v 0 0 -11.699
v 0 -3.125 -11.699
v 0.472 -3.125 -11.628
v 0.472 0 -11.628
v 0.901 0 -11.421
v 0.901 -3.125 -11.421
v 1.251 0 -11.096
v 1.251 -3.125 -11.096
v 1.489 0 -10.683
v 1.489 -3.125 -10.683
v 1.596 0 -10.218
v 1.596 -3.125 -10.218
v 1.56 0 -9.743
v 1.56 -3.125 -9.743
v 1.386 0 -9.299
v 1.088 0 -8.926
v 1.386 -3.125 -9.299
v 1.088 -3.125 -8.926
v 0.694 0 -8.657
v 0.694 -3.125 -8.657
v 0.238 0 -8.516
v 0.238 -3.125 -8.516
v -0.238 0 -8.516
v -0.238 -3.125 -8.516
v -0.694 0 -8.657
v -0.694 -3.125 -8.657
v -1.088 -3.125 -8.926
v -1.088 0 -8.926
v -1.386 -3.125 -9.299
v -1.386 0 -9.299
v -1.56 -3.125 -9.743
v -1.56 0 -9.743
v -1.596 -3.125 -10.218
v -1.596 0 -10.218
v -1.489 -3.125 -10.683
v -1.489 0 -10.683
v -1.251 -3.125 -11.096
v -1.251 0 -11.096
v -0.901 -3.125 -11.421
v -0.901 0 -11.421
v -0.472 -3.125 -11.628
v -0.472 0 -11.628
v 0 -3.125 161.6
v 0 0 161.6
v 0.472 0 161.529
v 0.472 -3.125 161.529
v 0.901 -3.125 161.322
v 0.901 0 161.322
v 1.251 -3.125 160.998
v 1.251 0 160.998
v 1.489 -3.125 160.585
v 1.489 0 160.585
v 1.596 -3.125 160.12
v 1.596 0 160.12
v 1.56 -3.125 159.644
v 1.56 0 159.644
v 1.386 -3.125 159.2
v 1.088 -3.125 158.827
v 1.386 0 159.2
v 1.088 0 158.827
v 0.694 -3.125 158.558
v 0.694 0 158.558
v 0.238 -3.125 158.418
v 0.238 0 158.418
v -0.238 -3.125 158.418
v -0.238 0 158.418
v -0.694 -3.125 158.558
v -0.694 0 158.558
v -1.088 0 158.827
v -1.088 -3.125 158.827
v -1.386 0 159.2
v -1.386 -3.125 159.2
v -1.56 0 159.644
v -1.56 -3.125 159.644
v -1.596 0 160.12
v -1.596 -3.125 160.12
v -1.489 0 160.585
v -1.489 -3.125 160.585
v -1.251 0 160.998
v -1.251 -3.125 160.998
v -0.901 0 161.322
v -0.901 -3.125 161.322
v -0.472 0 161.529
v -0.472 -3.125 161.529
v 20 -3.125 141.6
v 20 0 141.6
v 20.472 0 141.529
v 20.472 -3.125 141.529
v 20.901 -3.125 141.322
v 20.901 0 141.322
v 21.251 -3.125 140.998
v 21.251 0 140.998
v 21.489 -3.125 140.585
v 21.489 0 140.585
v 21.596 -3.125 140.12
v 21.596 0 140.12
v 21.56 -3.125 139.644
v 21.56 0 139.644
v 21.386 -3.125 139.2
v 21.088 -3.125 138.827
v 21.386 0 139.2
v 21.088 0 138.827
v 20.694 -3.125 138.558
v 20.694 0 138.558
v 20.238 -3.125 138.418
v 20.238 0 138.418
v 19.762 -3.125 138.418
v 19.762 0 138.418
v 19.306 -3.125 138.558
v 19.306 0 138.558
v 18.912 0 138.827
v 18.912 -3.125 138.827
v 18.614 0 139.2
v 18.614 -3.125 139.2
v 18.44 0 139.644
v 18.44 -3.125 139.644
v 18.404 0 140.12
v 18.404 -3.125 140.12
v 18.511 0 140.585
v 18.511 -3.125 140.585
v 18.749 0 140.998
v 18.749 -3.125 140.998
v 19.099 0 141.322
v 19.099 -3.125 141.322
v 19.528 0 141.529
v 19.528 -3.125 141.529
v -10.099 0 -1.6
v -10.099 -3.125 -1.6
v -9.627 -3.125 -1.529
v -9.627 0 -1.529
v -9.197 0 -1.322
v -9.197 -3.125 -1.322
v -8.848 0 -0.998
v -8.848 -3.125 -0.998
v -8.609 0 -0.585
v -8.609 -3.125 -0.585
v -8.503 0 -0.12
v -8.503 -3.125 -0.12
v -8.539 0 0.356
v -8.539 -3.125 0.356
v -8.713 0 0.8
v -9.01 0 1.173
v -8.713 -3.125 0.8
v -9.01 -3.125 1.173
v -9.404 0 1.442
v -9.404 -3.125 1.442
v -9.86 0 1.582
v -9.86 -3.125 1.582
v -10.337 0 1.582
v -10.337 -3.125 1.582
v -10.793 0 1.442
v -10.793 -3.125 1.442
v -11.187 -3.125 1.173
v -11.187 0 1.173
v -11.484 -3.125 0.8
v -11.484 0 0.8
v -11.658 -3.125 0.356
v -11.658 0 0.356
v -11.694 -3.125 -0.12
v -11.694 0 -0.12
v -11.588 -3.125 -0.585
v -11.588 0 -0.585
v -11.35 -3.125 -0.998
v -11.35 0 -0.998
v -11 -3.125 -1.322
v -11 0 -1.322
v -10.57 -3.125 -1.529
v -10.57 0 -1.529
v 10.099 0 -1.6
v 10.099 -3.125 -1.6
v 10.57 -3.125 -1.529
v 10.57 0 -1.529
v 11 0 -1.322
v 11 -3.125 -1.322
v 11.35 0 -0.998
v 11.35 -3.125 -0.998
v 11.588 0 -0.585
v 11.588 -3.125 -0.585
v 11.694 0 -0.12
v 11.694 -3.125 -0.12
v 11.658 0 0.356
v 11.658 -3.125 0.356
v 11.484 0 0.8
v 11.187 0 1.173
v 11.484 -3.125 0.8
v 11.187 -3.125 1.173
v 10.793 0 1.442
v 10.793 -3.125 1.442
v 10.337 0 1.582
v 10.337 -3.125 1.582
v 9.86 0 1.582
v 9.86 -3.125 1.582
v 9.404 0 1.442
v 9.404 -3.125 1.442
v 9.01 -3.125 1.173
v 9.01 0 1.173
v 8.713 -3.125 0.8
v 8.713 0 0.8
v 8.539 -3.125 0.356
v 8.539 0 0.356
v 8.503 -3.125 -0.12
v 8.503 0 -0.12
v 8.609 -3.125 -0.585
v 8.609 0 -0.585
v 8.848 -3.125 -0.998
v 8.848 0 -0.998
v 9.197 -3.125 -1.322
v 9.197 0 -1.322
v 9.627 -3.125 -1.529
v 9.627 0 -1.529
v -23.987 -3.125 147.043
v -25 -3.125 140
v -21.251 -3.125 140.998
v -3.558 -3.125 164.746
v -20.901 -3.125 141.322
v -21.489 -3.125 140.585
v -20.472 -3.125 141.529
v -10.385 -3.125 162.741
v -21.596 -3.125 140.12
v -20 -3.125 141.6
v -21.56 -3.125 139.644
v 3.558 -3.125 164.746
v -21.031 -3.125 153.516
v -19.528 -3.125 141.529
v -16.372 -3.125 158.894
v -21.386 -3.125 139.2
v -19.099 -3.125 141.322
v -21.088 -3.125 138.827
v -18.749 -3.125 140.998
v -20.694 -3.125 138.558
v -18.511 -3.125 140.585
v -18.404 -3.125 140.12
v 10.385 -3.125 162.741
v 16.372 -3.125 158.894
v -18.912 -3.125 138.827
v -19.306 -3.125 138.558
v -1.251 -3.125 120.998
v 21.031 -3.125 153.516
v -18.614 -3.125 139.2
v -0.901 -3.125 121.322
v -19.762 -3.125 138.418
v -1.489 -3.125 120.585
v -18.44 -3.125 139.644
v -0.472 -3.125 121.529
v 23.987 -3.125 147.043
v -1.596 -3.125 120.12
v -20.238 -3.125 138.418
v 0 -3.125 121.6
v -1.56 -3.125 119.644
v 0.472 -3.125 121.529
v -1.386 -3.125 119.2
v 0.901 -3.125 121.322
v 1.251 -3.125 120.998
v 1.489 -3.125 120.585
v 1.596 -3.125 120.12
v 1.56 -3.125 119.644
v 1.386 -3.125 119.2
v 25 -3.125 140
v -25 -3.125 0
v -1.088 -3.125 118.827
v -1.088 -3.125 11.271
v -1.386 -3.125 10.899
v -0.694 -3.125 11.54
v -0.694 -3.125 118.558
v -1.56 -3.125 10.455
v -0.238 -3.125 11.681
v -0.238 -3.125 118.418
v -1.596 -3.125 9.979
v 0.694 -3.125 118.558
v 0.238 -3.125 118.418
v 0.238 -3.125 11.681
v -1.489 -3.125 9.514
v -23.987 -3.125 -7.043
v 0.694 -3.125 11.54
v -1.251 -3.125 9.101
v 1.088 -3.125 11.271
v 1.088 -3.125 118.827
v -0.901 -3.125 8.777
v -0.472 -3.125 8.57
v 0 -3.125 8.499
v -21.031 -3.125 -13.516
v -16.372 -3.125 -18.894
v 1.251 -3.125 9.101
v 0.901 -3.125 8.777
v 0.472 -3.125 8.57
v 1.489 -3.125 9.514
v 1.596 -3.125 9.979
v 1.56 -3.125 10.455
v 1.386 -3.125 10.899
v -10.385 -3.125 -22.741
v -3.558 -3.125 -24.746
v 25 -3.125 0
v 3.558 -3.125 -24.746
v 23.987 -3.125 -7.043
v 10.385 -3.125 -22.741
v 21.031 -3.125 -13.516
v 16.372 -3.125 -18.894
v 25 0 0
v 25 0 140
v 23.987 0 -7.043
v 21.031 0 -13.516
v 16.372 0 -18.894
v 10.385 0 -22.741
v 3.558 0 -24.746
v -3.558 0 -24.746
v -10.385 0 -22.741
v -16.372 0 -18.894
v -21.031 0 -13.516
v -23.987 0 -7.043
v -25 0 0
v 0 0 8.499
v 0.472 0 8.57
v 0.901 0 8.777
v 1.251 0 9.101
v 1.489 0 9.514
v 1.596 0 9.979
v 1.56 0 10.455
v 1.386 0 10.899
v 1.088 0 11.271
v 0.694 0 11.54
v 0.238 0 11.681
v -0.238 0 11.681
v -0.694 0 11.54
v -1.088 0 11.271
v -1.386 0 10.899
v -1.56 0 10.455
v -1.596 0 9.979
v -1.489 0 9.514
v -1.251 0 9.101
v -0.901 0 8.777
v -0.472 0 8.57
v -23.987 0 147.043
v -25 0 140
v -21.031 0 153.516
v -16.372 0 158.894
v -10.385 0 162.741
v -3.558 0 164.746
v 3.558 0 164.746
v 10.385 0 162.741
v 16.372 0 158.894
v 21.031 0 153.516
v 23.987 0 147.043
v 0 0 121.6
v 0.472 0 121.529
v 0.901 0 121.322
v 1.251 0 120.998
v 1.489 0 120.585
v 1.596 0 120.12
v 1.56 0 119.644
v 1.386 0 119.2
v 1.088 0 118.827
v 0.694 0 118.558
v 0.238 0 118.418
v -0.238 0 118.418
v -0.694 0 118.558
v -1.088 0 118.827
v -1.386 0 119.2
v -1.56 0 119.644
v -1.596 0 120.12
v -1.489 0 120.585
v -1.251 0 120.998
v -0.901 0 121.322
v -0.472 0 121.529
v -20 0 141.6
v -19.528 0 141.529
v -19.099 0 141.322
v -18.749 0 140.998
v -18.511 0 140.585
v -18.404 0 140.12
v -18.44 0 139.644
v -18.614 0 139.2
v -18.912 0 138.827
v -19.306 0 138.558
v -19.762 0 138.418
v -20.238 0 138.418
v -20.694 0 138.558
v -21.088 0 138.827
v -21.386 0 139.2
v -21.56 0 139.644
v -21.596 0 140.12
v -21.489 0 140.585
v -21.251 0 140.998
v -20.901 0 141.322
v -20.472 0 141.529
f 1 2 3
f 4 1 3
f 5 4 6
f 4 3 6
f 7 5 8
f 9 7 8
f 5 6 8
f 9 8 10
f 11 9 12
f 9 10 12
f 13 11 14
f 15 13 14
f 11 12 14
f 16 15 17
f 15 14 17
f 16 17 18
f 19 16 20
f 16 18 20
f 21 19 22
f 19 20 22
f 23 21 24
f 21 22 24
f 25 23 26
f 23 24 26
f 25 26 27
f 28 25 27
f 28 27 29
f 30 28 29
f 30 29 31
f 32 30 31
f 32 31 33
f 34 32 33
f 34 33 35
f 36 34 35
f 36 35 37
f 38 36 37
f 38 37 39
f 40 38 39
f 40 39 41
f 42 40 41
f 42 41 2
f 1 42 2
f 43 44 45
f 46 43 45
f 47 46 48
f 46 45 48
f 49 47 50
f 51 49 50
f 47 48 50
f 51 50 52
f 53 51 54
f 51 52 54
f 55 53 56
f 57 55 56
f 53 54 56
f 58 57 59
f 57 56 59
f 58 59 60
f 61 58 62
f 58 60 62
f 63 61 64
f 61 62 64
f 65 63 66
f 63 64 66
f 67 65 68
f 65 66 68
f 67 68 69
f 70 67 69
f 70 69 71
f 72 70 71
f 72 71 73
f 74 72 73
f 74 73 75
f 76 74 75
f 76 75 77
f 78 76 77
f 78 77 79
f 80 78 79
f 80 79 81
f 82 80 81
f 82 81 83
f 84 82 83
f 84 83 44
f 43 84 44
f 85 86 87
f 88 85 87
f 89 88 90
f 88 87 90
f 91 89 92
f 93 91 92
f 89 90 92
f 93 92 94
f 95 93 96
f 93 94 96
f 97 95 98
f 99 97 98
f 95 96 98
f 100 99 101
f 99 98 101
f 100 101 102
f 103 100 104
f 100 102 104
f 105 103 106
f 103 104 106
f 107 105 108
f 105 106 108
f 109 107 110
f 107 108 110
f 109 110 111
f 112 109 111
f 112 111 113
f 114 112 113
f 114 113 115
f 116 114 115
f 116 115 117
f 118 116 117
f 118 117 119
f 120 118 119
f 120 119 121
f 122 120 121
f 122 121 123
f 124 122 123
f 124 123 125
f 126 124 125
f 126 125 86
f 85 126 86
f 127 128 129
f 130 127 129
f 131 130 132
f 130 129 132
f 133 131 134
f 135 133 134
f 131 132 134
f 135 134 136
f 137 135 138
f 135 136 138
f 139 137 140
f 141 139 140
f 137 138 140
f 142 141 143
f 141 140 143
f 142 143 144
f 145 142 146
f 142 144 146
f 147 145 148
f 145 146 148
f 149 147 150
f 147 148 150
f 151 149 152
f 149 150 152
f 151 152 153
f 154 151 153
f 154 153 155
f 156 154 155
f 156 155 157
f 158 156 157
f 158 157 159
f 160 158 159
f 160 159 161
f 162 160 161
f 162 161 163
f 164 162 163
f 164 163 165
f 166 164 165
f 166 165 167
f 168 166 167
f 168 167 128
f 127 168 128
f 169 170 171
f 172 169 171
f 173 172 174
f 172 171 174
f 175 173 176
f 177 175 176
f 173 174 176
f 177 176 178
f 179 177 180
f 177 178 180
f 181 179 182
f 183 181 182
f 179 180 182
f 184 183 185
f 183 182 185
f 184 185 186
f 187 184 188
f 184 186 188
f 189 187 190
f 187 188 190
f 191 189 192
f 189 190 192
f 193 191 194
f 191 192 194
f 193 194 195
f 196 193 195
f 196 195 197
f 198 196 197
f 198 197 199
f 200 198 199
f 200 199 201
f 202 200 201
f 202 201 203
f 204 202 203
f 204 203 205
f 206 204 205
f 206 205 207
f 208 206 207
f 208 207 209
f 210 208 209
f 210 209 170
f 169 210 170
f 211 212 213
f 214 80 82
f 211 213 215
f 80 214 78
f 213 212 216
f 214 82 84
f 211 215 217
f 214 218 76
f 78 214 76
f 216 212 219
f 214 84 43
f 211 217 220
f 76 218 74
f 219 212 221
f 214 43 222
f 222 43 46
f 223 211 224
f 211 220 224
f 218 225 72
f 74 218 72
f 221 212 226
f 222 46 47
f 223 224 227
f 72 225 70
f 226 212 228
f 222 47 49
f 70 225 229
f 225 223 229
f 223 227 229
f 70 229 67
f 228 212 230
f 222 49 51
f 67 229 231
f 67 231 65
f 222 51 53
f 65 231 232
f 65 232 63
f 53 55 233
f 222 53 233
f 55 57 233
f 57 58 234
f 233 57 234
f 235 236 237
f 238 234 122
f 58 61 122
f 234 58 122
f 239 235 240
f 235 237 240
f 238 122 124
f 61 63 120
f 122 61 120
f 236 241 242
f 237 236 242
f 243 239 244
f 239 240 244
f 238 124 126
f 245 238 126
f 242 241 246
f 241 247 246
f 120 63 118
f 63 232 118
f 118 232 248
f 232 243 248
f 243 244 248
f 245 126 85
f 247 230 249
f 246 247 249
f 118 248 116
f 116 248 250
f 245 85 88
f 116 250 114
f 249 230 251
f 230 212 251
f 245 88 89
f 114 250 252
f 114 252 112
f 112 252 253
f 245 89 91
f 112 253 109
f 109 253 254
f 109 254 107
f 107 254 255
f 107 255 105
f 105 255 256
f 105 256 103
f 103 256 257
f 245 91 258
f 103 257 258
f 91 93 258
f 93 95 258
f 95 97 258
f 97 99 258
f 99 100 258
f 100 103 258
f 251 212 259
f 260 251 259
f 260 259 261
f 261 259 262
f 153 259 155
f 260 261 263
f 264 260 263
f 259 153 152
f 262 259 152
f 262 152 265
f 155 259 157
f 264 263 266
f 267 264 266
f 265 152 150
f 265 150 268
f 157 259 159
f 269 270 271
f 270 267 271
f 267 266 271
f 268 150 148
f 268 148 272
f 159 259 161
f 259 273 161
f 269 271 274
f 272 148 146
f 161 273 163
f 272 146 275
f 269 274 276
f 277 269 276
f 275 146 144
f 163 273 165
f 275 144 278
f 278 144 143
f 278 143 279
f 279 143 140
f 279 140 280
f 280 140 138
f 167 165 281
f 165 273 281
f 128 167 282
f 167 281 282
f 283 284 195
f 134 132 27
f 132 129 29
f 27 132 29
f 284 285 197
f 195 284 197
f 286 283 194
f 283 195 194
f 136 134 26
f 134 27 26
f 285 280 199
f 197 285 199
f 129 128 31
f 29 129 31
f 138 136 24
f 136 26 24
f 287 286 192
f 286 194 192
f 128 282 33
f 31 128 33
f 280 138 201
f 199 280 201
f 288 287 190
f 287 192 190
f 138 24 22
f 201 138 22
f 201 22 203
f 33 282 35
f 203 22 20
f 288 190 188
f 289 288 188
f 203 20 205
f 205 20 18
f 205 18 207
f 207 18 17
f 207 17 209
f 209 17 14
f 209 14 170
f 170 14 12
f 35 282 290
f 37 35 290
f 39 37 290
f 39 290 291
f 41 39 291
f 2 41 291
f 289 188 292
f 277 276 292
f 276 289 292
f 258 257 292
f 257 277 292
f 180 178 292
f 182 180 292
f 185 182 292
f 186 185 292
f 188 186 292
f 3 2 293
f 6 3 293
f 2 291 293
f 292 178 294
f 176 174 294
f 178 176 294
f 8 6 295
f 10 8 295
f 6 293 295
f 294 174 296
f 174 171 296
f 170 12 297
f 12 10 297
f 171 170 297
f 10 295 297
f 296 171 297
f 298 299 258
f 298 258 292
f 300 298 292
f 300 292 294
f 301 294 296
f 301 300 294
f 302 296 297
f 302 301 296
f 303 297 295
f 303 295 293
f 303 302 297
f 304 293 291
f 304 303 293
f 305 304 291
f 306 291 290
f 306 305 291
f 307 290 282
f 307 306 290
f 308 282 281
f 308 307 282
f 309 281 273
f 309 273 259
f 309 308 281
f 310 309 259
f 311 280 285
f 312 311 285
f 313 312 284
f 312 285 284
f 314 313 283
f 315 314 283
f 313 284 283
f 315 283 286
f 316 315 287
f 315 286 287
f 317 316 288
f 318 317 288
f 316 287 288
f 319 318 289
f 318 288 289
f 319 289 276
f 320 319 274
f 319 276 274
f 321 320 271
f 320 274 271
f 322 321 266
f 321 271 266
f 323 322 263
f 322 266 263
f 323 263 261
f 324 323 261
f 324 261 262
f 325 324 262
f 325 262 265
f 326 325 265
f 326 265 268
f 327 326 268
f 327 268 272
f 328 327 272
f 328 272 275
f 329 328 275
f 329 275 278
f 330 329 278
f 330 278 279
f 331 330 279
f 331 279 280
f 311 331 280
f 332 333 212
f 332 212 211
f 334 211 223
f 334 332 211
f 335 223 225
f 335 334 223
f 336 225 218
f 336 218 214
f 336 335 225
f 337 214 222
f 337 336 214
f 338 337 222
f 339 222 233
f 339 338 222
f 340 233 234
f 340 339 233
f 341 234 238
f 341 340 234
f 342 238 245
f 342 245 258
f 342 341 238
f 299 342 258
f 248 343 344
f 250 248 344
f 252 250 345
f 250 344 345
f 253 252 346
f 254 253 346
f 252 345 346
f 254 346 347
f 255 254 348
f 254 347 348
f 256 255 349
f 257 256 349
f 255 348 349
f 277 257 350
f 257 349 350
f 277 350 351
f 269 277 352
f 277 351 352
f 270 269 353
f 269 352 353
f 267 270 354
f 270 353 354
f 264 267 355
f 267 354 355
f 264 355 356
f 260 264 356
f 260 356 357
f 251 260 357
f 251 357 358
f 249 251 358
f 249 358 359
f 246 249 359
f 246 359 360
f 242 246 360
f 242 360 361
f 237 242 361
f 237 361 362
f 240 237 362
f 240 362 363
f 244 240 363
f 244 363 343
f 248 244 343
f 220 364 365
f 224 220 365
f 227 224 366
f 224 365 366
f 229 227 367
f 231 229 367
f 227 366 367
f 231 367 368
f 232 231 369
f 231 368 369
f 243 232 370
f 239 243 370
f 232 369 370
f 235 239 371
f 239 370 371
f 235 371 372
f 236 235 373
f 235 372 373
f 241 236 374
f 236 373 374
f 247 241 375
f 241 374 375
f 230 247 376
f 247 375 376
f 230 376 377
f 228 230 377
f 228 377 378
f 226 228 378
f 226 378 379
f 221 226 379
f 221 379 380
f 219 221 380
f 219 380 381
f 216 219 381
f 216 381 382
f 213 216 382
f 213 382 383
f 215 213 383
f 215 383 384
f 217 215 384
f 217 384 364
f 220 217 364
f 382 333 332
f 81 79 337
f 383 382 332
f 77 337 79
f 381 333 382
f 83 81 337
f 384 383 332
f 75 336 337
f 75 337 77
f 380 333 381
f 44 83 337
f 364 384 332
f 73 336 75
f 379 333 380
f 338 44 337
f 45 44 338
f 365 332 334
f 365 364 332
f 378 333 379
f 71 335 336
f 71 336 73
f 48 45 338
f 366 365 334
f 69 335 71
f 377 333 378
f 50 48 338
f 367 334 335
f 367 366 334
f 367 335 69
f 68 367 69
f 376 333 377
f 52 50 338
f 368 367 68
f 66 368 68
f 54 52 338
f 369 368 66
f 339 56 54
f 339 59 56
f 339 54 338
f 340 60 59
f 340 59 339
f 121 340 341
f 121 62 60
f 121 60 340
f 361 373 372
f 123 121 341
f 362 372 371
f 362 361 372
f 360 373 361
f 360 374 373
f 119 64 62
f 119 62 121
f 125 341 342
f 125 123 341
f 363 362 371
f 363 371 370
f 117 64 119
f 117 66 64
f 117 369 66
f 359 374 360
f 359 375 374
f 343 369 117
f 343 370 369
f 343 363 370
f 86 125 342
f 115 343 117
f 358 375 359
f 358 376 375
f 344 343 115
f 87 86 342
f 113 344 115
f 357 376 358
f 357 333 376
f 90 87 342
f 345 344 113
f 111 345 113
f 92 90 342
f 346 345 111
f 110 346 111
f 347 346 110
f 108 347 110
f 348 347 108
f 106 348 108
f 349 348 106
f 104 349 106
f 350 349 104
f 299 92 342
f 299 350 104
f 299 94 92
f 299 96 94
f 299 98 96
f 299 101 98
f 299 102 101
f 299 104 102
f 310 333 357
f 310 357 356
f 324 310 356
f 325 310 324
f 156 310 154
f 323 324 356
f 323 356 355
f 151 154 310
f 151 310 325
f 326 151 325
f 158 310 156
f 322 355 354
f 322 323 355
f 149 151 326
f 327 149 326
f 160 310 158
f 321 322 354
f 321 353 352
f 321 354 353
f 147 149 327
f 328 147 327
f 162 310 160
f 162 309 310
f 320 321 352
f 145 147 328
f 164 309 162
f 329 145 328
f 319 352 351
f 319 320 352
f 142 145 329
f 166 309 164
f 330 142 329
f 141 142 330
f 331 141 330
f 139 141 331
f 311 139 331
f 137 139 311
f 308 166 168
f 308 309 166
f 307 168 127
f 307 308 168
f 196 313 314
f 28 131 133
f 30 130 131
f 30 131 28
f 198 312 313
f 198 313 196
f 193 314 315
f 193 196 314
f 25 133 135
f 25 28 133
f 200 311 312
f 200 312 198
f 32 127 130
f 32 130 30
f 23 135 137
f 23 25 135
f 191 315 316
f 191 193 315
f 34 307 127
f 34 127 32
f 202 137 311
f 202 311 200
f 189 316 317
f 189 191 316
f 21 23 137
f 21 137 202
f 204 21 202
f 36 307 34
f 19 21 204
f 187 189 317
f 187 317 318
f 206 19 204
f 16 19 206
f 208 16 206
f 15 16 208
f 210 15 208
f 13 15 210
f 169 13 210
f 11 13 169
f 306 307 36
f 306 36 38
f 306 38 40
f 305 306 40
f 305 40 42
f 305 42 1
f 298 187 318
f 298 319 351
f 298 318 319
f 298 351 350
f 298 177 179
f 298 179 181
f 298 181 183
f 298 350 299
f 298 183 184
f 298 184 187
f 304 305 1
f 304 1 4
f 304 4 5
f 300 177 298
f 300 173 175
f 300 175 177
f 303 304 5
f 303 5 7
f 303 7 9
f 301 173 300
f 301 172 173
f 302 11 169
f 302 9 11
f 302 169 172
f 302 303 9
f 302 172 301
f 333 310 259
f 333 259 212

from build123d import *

# Parameters (mm, degrees)
BASE_FLANGE1_DEPTH = 3.125
SKETCH4_R          = 1.6
CUT_EXTRUDE1_DEPTH = 167.912448981
SKETCH6_R          = 1.6
CUT_EXTRUDE3_DEPTH = 167.912448981


# Sheet-metal steps are written as plain solids
with BuildPart() as part:
    # Sketch1 → Base-Flange1 (new body)
    with BuildSketch(Plane(origin=(0, 0, 0), x_dir=(1, 0, 0), z_dir=(0, 1, 0))):
        with BuildLine():
            Line((-25, 0), (-25, -140))
            ThreePointArc((-25, -140), (0, -165), (25, -140))
            Line((25, -140), (25, 0))
            ThreePointArc((25, 0), (0, 25), (-25, 0))
        make_face()
    extrude(amount=-BASE_FLANGE1_DEPTH)

    # Sketch4 → Cut-Extrude1 (cut, through all)
    with BuildSketch(Plane.XZ.offset(3.125)):
        with Locations(Location((0, -10.098593171, 0), (0, 0, 270))):
            Circle(SKETCH4_R)
        with Locations(Location((10.098593171, 0, 0), (0, 0, 270))):
            Circle(SKETCH4_R)
        with Locations(Location((-10.098593171, 0, 0), (0, 0, 270))):
            Circle(SKETCH4_R)
        with Locations(Location((0, 10.098593171, 0), (0, 0, 270))):
            Circle(SKETCH4_R)
    extrude(amount=-CUT_EXTRUDE1_DEPTH, mode=Mode.SUBTRACT)

    # Sketch6 → Cut-Extrude3 (cut, through all)
    with BuildSketch(Plane(origin=(0, 0, 0), x_dir=(1, 0, 0), z_dir=(0, 1, 0))):
        with Locations(Location((0, -120, 0), (0, 0, 270))):
            Circle(SKETCH6_R)
        with Locations(Location((-20, -140, 0), (0, 0, 270))):
            Circle(SKETCH6_R)
        with Locations(Location((0, -160, 0), (0, 0, 270))):
            Circle(SKETCH6_R)
        with Locations(Location((20, -140, 0), (0, 0, 270))):
            Circle(SKETCH6_R)
    extrude(amount=-CUT_EXTRUDE3_DEPTH, mode=Mode.SUBTRACT)


solid = part.part
